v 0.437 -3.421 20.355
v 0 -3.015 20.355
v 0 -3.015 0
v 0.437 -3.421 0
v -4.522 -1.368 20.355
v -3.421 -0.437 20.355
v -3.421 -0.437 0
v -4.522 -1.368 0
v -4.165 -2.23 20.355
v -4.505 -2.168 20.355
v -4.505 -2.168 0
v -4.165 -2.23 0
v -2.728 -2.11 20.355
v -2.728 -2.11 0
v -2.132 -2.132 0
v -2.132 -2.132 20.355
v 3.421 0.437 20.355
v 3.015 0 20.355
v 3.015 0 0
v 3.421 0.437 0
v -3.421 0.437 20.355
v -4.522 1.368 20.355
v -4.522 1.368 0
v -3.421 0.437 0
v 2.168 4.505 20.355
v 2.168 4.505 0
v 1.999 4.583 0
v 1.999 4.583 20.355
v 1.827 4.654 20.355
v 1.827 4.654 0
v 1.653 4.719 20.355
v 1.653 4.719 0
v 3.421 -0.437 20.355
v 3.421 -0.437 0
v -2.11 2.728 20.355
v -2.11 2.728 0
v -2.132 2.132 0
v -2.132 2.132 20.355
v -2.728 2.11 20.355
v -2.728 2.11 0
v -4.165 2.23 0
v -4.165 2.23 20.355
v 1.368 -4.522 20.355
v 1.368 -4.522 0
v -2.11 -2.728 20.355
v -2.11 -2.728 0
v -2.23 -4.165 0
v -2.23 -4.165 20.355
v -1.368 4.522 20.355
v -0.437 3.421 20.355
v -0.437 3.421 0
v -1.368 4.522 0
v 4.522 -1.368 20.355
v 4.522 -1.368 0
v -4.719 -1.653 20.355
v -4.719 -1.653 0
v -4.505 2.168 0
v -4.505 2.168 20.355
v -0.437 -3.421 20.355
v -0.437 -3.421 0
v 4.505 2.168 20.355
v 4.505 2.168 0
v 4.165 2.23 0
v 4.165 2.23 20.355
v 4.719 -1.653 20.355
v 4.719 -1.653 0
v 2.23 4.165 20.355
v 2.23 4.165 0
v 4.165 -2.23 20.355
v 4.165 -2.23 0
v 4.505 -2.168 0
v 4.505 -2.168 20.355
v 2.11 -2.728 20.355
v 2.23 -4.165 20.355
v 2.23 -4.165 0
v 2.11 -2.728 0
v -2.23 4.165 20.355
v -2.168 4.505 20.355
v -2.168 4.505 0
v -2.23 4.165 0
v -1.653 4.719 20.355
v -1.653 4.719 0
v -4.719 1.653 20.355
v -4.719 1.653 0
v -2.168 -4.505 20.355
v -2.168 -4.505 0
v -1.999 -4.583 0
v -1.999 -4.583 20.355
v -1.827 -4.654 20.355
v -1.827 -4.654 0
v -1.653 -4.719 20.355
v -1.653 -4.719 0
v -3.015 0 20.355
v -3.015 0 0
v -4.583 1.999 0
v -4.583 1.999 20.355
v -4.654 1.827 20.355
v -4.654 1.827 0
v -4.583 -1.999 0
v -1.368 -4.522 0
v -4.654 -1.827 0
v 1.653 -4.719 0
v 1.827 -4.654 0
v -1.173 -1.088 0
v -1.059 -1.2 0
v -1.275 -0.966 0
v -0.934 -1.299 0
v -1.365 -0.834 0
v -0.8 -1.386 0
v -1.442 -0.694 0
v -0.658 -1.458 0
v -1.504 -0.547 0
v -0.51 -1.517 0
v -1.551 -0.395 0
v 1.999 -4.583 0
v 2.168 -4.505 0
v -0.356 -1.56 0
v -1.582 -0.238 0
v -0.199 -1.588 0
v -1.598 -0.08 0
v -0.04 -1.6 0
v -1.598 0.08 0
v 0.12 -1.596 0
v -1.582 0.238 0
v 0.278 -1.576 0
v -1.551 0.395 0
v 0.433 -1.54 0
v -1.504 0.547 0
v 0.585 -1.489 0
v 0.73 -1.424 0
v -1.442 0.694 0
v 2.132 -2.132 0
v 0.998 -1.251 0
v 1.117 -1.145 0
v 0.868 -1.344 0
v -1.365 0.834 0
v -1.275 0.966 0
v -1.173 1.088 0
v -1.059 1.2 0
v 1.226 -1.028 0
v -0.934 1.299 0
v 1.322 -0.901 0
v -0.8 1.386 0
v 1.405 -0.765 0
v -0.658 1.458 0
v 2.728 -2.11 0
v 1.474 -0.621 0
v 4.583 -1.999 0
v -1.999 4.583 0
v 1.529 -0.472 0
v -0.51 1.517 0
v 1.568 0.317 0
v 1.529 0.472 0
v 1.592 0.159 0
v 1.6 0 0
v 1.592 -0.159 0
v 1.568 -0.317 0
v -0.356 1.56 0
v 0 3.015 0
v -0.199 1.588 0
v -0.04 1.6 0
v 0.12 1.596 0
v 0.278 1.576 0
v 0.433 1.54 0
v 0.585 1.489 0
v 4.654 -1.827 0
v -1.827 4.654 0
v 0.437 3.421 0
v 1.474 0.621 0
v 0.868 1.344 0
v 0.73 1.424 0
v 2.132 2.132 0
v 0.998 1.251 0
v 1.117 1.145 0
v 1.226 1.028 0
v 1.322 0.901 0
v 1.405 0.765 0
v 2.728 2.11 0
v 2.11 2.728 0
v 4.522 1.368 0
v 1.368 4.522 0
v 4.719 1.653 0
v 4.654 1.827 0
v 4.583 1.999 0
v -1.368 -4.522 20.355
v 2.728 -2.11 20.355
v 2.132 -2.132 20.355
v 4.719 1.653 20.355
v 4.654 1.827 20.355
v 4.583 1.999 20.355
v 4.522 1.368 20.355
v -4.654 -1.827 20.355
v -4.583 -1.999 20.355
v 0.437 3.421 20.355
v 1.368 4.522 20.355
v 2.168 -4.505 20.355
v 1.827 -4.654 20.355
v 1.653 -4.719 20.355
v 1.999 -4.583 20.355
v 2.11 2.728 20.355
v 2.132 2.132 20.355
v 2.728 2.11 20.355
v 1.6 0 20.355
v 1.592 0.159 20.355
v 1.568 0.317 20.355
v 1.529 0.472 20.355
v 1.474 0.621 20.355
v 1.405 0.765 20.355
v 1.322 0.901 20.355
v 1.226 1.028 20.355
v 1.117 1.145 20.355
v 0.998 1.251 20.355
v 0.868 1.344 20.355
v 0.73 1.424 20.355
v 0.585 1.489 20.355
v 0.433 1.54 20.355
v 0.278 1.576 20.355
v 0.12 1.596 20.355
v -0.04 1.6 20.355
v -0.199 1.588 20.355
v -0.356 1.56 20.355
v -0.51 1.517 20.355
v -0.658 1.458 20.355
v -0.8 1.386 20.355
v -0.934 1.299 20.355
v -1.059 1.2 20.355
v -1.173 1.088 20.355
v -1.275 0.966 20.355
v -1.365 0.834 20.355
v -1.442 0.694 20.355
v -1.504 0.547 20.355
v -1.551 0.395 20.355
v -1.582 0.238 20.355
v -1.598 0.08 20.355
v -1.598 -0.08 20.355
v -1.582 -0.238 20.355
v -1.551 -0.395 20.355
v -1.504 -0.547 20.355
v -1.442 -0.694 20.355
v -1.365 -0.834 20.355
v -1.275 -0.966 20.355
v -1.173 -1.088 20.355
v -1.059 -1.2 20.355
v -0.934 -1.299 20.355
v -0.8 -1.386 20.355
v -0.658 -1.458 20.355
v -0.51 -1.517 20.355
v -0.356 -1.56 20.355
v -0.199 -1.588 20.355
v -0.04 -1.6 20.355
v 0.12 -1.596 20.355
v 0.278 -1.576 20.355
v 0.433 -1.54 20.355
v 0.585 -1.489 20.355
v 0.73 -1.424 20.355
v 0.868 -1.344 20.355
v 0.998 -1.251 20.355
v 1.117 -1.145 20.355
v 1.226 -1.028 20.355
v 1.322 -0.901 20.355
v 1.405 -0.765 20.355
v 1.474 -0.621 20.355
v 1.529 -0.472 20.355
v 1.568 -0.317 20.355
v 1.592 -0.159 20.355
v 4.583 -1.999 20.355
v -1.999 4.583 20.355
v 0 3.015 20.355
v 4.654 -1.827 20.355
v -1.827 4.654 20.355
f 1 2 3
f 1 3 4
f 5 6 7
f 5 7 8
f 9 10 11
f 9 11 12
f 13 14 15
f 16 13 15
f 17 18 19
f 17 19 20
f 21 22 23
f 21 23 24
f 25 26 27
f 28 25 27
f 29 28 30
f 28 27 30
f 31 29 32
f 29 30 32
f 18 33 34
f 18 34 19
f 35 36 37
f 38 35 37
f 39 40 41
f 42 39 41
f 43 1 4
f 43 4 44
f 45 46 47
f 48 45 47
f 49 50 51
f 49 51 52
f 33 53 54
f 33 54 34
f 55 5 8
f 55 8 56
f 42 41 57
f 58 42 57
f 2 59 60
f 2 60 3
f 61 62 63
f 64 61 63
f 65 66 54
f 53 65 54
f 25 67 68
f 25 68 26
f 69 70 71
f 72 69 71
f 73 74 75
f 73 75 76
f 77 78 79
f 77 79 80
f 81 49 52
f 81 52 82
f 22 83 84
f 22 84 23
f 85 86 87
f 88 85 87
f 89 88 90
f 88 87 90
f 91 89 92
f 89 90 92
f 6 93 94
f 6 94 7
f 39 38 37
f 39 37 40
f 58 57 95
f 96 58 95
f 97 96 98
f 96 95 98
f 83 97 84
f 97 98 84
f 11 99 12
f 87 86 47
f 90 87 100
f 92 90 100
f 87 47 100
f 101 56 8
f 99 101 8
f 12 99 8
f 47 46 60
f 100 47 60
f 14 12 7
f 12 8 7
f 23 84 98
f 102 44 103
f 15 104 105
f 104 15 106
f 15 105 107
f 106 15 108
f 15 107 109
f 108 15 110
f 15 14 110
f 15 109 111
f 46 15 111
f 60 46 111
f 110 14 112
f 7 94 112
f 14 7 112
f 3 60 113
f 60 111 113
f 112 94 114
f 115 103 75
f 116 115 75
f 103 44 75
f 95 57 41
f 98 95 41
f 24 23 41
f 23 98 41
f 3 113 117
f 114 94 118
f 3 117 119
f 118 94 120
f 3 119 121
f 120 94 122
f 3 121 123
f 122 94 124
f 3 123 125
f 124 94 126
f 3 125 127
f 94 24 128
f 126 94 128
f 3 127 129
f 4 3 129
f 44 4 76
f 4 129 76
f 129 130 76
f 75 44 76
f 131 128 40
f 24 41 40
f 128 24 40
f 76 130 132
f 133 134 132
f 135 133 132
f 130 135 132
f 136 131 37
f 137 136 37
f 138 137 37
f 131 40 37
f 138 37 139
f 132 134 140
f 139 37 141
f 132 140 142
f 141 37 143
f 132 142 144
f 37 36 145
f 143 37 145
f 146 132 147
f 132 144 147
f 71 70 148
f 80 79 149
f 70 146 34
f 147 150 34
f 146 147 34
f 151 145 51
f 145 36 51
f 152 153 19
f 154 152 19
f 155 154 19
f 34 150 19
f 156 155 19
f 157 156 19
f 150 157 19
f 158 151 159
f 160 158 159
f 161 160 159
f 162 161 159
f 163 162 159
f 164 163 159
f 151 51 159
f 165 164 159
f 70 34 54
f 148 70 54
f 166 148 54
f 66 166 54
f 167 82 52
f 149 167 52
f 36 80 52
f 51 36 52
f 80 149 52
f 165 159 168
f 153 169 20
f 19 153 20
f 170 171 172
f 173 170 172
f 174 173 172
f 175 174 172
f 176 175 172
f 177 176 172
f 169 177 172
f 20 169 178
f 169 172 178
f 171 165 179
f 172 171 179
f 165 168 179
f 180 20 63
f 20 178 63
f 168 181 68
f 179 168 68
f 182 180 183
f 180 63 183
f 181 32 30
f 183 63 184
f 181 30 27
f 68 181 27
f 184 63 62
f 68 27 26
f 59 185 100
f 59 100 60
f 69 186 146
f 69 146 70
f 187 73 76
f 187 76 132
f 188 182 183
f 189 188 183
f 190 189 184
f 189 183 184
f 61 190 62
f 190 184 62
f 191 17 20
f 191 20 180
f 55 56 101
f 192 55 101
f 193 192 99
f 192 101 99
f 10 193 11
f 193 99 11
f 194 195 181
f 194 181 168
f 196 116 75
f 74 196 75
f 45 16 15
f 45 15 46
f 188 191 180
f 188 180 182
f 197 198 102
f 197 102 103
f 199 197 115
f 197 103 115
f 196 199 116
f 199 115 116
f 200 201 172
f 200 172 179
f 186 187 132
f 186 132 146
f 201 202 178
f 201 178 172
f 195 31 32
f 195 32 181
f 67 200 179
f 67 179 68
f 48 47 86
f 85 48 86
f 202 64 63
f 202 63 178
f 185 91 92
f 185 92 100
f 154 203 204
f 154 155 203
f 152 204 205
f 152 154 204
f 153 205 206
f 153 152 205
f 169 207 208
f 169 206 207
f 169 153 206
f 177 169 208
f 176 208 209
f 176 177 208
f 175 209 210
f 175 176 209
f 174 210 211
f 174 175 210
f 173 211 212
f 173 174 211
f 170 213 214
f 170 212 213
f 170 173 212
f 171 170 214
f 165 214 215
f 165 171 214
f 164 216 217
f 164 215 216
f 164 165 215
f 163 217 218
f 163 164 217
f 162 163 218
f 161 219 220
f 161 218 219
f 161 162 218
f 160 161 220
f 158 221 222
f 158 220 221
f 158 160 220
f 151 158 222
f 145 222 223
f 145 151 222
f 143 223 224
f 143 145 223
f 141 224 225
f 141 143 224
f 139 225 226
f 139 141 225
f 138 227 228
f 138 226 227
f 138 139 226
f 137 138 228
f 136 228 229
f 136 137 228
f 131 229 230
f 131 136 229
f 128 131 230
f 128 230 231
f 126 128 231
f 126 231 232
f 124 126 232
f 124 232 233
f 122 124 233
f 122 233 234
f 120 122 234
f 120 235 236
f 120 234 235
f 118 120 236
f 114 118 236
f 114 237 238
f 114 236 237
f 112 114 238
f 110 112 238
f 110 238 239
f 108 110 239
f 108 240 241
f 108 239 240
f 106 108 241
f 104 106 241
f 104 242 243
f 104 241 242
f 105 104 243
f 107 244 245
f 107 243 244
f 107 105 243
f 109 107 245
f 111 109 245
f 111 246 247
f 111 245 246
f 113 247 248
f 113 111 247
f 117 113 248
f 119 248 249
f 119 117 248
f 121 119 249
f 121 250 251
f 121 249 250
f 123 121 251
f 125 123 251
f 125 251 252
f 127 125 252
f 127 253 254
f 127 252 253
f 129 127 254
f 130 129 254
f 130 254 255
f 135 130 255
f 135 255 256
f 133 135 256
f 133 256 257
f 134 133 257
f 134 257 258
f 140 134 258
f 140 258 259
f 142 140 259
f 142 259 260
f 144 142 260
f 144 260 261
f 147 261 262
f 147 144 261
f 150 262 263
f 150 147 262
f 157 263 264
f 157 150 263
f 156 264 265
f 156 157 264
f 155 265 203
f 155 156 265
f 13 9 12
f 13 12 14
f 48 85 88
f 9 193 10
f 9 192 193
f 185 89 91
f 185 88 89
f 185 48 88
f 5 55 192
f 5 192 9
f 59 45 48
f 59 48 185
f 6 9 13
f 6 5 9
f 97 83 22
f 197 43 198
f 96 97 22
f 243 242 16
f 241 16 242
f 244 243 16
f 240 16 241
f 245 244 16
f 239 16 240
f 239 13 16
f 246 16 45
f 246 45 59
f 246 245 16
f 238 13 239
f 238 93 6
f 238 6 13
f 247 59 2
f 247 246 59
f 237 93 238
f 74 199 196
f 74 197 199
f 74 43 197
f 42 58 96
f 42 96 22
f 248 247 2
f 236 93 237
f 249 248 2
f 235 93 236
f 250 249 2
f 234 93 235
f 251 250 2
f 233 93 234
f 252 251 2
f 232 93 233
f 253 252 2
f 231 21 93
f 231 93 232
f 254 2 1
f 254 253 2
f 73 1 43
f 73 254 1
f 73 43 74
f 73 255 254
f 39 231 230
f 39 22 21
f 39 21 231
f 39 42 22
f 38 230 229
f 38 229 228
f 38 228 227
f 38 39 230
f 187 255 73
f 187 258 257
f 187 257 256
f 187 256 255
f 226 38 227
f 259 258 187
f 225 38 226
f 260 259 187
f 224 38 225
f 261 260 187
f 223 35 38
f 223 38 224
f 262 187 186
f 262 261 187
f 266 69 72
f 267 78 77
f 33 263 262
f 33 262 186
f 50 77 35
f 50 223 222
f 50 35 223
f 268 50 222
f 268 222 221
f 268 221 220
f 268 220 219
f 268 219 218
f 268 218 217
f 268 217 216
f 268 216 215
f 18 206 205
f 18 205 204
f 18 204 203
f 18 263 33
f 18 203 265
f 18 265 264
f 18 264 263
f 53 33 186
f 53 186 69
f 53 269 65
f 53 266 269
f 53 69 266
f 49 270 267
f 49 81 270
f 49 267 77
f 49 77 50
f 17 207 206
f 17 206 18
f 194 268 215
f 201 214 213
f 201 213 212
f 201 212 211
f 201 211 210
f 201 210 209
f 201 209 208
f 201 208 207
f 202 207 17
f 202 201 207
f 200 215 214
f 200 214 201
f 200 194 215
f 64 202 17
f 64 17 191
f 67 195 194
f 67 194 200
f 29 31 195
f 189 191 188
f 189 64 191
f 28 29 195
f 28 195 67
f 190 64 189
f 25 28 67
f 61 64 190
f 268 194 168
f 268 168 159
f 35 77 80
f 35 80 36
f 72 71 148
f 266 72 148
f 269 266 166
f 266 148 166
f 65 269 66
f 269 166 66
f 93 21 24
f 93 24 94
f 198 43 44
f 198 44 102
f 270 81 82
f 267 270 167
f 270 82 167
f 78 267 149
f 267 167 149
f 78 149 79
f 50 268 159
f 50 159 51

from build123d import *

# Parameters (mm, degrees)
SKETCH1_R               = 5
BOSS_EXTRUDE1_DEPTH     = 20.355
CUT_EXTRUDE1_DEPTH      = 22.548225565
CIRPATTERN1_COUNT       = 8
CUT_EXTRUDE2_DEPTH      = 22.421117005
CUT_EXTRUDE2_DEPTH_BACK = 22.421117005
SKETCH4_R               = 1.6


with BuildPart() as part:
    # Sketch1 → Boss-Extrude1 (new body)
    with BuildSketch(Plane.XY):
        Circle(SKETCH1_R)
    extrude(amount=BOSS_EXTRUDE1_DEPTH)

    # Sketch2 → Cut-Extrude1 (cut, through all)
    with BuildSketch(Plane.XY):
        Polygon((0, 3.015315818), (-0.43705364, 3.420638152), (-1.367879142, 4.521896493), (-1.652539145, 4.719016251), (-1.899055149, 5.271190713), (0, 6.265180055), (1.899055149, 5.271190713), (1.652539145, 4.719016251), (1.367879142, 4.521896493), (0.43705364, 3.420638152), align=None)
    cut_extrude1 = extrude(amount=CUT_EXTRUDE1_DEPTH, mode=Mode.SUBTRACT)

    # CirPattern1: Cut-Extrude1 ×8 about axis
    cirpattern1_axis = Axis((0, 0, 0), (0, 0, 1))
    for i in range(1, CIRPATTERN1_COUNT):
        add(cut_extrude1.rotate(cirpattern1_axis, i * 360 / CIRPATTERN1_COUNT), mode=Mode.SUBTRACT)

    # Sketch4 → Cut-Extrude2 (cut, two sides: drawn at the far end of the back side and taken through both)
    with BuildSketch(Plane.XY.offset(20.355).offset(-CUT_EXTRUDE2_DEPTH_BACK)):
        Circle(SKETCH4_R)
    extrude(amount=CUT_EXTRUDE2_DEPTH + CUT_EXTRUDE2_DEPTH_BACK, mode=Mode.SUBTRACT)


solid = part.part
